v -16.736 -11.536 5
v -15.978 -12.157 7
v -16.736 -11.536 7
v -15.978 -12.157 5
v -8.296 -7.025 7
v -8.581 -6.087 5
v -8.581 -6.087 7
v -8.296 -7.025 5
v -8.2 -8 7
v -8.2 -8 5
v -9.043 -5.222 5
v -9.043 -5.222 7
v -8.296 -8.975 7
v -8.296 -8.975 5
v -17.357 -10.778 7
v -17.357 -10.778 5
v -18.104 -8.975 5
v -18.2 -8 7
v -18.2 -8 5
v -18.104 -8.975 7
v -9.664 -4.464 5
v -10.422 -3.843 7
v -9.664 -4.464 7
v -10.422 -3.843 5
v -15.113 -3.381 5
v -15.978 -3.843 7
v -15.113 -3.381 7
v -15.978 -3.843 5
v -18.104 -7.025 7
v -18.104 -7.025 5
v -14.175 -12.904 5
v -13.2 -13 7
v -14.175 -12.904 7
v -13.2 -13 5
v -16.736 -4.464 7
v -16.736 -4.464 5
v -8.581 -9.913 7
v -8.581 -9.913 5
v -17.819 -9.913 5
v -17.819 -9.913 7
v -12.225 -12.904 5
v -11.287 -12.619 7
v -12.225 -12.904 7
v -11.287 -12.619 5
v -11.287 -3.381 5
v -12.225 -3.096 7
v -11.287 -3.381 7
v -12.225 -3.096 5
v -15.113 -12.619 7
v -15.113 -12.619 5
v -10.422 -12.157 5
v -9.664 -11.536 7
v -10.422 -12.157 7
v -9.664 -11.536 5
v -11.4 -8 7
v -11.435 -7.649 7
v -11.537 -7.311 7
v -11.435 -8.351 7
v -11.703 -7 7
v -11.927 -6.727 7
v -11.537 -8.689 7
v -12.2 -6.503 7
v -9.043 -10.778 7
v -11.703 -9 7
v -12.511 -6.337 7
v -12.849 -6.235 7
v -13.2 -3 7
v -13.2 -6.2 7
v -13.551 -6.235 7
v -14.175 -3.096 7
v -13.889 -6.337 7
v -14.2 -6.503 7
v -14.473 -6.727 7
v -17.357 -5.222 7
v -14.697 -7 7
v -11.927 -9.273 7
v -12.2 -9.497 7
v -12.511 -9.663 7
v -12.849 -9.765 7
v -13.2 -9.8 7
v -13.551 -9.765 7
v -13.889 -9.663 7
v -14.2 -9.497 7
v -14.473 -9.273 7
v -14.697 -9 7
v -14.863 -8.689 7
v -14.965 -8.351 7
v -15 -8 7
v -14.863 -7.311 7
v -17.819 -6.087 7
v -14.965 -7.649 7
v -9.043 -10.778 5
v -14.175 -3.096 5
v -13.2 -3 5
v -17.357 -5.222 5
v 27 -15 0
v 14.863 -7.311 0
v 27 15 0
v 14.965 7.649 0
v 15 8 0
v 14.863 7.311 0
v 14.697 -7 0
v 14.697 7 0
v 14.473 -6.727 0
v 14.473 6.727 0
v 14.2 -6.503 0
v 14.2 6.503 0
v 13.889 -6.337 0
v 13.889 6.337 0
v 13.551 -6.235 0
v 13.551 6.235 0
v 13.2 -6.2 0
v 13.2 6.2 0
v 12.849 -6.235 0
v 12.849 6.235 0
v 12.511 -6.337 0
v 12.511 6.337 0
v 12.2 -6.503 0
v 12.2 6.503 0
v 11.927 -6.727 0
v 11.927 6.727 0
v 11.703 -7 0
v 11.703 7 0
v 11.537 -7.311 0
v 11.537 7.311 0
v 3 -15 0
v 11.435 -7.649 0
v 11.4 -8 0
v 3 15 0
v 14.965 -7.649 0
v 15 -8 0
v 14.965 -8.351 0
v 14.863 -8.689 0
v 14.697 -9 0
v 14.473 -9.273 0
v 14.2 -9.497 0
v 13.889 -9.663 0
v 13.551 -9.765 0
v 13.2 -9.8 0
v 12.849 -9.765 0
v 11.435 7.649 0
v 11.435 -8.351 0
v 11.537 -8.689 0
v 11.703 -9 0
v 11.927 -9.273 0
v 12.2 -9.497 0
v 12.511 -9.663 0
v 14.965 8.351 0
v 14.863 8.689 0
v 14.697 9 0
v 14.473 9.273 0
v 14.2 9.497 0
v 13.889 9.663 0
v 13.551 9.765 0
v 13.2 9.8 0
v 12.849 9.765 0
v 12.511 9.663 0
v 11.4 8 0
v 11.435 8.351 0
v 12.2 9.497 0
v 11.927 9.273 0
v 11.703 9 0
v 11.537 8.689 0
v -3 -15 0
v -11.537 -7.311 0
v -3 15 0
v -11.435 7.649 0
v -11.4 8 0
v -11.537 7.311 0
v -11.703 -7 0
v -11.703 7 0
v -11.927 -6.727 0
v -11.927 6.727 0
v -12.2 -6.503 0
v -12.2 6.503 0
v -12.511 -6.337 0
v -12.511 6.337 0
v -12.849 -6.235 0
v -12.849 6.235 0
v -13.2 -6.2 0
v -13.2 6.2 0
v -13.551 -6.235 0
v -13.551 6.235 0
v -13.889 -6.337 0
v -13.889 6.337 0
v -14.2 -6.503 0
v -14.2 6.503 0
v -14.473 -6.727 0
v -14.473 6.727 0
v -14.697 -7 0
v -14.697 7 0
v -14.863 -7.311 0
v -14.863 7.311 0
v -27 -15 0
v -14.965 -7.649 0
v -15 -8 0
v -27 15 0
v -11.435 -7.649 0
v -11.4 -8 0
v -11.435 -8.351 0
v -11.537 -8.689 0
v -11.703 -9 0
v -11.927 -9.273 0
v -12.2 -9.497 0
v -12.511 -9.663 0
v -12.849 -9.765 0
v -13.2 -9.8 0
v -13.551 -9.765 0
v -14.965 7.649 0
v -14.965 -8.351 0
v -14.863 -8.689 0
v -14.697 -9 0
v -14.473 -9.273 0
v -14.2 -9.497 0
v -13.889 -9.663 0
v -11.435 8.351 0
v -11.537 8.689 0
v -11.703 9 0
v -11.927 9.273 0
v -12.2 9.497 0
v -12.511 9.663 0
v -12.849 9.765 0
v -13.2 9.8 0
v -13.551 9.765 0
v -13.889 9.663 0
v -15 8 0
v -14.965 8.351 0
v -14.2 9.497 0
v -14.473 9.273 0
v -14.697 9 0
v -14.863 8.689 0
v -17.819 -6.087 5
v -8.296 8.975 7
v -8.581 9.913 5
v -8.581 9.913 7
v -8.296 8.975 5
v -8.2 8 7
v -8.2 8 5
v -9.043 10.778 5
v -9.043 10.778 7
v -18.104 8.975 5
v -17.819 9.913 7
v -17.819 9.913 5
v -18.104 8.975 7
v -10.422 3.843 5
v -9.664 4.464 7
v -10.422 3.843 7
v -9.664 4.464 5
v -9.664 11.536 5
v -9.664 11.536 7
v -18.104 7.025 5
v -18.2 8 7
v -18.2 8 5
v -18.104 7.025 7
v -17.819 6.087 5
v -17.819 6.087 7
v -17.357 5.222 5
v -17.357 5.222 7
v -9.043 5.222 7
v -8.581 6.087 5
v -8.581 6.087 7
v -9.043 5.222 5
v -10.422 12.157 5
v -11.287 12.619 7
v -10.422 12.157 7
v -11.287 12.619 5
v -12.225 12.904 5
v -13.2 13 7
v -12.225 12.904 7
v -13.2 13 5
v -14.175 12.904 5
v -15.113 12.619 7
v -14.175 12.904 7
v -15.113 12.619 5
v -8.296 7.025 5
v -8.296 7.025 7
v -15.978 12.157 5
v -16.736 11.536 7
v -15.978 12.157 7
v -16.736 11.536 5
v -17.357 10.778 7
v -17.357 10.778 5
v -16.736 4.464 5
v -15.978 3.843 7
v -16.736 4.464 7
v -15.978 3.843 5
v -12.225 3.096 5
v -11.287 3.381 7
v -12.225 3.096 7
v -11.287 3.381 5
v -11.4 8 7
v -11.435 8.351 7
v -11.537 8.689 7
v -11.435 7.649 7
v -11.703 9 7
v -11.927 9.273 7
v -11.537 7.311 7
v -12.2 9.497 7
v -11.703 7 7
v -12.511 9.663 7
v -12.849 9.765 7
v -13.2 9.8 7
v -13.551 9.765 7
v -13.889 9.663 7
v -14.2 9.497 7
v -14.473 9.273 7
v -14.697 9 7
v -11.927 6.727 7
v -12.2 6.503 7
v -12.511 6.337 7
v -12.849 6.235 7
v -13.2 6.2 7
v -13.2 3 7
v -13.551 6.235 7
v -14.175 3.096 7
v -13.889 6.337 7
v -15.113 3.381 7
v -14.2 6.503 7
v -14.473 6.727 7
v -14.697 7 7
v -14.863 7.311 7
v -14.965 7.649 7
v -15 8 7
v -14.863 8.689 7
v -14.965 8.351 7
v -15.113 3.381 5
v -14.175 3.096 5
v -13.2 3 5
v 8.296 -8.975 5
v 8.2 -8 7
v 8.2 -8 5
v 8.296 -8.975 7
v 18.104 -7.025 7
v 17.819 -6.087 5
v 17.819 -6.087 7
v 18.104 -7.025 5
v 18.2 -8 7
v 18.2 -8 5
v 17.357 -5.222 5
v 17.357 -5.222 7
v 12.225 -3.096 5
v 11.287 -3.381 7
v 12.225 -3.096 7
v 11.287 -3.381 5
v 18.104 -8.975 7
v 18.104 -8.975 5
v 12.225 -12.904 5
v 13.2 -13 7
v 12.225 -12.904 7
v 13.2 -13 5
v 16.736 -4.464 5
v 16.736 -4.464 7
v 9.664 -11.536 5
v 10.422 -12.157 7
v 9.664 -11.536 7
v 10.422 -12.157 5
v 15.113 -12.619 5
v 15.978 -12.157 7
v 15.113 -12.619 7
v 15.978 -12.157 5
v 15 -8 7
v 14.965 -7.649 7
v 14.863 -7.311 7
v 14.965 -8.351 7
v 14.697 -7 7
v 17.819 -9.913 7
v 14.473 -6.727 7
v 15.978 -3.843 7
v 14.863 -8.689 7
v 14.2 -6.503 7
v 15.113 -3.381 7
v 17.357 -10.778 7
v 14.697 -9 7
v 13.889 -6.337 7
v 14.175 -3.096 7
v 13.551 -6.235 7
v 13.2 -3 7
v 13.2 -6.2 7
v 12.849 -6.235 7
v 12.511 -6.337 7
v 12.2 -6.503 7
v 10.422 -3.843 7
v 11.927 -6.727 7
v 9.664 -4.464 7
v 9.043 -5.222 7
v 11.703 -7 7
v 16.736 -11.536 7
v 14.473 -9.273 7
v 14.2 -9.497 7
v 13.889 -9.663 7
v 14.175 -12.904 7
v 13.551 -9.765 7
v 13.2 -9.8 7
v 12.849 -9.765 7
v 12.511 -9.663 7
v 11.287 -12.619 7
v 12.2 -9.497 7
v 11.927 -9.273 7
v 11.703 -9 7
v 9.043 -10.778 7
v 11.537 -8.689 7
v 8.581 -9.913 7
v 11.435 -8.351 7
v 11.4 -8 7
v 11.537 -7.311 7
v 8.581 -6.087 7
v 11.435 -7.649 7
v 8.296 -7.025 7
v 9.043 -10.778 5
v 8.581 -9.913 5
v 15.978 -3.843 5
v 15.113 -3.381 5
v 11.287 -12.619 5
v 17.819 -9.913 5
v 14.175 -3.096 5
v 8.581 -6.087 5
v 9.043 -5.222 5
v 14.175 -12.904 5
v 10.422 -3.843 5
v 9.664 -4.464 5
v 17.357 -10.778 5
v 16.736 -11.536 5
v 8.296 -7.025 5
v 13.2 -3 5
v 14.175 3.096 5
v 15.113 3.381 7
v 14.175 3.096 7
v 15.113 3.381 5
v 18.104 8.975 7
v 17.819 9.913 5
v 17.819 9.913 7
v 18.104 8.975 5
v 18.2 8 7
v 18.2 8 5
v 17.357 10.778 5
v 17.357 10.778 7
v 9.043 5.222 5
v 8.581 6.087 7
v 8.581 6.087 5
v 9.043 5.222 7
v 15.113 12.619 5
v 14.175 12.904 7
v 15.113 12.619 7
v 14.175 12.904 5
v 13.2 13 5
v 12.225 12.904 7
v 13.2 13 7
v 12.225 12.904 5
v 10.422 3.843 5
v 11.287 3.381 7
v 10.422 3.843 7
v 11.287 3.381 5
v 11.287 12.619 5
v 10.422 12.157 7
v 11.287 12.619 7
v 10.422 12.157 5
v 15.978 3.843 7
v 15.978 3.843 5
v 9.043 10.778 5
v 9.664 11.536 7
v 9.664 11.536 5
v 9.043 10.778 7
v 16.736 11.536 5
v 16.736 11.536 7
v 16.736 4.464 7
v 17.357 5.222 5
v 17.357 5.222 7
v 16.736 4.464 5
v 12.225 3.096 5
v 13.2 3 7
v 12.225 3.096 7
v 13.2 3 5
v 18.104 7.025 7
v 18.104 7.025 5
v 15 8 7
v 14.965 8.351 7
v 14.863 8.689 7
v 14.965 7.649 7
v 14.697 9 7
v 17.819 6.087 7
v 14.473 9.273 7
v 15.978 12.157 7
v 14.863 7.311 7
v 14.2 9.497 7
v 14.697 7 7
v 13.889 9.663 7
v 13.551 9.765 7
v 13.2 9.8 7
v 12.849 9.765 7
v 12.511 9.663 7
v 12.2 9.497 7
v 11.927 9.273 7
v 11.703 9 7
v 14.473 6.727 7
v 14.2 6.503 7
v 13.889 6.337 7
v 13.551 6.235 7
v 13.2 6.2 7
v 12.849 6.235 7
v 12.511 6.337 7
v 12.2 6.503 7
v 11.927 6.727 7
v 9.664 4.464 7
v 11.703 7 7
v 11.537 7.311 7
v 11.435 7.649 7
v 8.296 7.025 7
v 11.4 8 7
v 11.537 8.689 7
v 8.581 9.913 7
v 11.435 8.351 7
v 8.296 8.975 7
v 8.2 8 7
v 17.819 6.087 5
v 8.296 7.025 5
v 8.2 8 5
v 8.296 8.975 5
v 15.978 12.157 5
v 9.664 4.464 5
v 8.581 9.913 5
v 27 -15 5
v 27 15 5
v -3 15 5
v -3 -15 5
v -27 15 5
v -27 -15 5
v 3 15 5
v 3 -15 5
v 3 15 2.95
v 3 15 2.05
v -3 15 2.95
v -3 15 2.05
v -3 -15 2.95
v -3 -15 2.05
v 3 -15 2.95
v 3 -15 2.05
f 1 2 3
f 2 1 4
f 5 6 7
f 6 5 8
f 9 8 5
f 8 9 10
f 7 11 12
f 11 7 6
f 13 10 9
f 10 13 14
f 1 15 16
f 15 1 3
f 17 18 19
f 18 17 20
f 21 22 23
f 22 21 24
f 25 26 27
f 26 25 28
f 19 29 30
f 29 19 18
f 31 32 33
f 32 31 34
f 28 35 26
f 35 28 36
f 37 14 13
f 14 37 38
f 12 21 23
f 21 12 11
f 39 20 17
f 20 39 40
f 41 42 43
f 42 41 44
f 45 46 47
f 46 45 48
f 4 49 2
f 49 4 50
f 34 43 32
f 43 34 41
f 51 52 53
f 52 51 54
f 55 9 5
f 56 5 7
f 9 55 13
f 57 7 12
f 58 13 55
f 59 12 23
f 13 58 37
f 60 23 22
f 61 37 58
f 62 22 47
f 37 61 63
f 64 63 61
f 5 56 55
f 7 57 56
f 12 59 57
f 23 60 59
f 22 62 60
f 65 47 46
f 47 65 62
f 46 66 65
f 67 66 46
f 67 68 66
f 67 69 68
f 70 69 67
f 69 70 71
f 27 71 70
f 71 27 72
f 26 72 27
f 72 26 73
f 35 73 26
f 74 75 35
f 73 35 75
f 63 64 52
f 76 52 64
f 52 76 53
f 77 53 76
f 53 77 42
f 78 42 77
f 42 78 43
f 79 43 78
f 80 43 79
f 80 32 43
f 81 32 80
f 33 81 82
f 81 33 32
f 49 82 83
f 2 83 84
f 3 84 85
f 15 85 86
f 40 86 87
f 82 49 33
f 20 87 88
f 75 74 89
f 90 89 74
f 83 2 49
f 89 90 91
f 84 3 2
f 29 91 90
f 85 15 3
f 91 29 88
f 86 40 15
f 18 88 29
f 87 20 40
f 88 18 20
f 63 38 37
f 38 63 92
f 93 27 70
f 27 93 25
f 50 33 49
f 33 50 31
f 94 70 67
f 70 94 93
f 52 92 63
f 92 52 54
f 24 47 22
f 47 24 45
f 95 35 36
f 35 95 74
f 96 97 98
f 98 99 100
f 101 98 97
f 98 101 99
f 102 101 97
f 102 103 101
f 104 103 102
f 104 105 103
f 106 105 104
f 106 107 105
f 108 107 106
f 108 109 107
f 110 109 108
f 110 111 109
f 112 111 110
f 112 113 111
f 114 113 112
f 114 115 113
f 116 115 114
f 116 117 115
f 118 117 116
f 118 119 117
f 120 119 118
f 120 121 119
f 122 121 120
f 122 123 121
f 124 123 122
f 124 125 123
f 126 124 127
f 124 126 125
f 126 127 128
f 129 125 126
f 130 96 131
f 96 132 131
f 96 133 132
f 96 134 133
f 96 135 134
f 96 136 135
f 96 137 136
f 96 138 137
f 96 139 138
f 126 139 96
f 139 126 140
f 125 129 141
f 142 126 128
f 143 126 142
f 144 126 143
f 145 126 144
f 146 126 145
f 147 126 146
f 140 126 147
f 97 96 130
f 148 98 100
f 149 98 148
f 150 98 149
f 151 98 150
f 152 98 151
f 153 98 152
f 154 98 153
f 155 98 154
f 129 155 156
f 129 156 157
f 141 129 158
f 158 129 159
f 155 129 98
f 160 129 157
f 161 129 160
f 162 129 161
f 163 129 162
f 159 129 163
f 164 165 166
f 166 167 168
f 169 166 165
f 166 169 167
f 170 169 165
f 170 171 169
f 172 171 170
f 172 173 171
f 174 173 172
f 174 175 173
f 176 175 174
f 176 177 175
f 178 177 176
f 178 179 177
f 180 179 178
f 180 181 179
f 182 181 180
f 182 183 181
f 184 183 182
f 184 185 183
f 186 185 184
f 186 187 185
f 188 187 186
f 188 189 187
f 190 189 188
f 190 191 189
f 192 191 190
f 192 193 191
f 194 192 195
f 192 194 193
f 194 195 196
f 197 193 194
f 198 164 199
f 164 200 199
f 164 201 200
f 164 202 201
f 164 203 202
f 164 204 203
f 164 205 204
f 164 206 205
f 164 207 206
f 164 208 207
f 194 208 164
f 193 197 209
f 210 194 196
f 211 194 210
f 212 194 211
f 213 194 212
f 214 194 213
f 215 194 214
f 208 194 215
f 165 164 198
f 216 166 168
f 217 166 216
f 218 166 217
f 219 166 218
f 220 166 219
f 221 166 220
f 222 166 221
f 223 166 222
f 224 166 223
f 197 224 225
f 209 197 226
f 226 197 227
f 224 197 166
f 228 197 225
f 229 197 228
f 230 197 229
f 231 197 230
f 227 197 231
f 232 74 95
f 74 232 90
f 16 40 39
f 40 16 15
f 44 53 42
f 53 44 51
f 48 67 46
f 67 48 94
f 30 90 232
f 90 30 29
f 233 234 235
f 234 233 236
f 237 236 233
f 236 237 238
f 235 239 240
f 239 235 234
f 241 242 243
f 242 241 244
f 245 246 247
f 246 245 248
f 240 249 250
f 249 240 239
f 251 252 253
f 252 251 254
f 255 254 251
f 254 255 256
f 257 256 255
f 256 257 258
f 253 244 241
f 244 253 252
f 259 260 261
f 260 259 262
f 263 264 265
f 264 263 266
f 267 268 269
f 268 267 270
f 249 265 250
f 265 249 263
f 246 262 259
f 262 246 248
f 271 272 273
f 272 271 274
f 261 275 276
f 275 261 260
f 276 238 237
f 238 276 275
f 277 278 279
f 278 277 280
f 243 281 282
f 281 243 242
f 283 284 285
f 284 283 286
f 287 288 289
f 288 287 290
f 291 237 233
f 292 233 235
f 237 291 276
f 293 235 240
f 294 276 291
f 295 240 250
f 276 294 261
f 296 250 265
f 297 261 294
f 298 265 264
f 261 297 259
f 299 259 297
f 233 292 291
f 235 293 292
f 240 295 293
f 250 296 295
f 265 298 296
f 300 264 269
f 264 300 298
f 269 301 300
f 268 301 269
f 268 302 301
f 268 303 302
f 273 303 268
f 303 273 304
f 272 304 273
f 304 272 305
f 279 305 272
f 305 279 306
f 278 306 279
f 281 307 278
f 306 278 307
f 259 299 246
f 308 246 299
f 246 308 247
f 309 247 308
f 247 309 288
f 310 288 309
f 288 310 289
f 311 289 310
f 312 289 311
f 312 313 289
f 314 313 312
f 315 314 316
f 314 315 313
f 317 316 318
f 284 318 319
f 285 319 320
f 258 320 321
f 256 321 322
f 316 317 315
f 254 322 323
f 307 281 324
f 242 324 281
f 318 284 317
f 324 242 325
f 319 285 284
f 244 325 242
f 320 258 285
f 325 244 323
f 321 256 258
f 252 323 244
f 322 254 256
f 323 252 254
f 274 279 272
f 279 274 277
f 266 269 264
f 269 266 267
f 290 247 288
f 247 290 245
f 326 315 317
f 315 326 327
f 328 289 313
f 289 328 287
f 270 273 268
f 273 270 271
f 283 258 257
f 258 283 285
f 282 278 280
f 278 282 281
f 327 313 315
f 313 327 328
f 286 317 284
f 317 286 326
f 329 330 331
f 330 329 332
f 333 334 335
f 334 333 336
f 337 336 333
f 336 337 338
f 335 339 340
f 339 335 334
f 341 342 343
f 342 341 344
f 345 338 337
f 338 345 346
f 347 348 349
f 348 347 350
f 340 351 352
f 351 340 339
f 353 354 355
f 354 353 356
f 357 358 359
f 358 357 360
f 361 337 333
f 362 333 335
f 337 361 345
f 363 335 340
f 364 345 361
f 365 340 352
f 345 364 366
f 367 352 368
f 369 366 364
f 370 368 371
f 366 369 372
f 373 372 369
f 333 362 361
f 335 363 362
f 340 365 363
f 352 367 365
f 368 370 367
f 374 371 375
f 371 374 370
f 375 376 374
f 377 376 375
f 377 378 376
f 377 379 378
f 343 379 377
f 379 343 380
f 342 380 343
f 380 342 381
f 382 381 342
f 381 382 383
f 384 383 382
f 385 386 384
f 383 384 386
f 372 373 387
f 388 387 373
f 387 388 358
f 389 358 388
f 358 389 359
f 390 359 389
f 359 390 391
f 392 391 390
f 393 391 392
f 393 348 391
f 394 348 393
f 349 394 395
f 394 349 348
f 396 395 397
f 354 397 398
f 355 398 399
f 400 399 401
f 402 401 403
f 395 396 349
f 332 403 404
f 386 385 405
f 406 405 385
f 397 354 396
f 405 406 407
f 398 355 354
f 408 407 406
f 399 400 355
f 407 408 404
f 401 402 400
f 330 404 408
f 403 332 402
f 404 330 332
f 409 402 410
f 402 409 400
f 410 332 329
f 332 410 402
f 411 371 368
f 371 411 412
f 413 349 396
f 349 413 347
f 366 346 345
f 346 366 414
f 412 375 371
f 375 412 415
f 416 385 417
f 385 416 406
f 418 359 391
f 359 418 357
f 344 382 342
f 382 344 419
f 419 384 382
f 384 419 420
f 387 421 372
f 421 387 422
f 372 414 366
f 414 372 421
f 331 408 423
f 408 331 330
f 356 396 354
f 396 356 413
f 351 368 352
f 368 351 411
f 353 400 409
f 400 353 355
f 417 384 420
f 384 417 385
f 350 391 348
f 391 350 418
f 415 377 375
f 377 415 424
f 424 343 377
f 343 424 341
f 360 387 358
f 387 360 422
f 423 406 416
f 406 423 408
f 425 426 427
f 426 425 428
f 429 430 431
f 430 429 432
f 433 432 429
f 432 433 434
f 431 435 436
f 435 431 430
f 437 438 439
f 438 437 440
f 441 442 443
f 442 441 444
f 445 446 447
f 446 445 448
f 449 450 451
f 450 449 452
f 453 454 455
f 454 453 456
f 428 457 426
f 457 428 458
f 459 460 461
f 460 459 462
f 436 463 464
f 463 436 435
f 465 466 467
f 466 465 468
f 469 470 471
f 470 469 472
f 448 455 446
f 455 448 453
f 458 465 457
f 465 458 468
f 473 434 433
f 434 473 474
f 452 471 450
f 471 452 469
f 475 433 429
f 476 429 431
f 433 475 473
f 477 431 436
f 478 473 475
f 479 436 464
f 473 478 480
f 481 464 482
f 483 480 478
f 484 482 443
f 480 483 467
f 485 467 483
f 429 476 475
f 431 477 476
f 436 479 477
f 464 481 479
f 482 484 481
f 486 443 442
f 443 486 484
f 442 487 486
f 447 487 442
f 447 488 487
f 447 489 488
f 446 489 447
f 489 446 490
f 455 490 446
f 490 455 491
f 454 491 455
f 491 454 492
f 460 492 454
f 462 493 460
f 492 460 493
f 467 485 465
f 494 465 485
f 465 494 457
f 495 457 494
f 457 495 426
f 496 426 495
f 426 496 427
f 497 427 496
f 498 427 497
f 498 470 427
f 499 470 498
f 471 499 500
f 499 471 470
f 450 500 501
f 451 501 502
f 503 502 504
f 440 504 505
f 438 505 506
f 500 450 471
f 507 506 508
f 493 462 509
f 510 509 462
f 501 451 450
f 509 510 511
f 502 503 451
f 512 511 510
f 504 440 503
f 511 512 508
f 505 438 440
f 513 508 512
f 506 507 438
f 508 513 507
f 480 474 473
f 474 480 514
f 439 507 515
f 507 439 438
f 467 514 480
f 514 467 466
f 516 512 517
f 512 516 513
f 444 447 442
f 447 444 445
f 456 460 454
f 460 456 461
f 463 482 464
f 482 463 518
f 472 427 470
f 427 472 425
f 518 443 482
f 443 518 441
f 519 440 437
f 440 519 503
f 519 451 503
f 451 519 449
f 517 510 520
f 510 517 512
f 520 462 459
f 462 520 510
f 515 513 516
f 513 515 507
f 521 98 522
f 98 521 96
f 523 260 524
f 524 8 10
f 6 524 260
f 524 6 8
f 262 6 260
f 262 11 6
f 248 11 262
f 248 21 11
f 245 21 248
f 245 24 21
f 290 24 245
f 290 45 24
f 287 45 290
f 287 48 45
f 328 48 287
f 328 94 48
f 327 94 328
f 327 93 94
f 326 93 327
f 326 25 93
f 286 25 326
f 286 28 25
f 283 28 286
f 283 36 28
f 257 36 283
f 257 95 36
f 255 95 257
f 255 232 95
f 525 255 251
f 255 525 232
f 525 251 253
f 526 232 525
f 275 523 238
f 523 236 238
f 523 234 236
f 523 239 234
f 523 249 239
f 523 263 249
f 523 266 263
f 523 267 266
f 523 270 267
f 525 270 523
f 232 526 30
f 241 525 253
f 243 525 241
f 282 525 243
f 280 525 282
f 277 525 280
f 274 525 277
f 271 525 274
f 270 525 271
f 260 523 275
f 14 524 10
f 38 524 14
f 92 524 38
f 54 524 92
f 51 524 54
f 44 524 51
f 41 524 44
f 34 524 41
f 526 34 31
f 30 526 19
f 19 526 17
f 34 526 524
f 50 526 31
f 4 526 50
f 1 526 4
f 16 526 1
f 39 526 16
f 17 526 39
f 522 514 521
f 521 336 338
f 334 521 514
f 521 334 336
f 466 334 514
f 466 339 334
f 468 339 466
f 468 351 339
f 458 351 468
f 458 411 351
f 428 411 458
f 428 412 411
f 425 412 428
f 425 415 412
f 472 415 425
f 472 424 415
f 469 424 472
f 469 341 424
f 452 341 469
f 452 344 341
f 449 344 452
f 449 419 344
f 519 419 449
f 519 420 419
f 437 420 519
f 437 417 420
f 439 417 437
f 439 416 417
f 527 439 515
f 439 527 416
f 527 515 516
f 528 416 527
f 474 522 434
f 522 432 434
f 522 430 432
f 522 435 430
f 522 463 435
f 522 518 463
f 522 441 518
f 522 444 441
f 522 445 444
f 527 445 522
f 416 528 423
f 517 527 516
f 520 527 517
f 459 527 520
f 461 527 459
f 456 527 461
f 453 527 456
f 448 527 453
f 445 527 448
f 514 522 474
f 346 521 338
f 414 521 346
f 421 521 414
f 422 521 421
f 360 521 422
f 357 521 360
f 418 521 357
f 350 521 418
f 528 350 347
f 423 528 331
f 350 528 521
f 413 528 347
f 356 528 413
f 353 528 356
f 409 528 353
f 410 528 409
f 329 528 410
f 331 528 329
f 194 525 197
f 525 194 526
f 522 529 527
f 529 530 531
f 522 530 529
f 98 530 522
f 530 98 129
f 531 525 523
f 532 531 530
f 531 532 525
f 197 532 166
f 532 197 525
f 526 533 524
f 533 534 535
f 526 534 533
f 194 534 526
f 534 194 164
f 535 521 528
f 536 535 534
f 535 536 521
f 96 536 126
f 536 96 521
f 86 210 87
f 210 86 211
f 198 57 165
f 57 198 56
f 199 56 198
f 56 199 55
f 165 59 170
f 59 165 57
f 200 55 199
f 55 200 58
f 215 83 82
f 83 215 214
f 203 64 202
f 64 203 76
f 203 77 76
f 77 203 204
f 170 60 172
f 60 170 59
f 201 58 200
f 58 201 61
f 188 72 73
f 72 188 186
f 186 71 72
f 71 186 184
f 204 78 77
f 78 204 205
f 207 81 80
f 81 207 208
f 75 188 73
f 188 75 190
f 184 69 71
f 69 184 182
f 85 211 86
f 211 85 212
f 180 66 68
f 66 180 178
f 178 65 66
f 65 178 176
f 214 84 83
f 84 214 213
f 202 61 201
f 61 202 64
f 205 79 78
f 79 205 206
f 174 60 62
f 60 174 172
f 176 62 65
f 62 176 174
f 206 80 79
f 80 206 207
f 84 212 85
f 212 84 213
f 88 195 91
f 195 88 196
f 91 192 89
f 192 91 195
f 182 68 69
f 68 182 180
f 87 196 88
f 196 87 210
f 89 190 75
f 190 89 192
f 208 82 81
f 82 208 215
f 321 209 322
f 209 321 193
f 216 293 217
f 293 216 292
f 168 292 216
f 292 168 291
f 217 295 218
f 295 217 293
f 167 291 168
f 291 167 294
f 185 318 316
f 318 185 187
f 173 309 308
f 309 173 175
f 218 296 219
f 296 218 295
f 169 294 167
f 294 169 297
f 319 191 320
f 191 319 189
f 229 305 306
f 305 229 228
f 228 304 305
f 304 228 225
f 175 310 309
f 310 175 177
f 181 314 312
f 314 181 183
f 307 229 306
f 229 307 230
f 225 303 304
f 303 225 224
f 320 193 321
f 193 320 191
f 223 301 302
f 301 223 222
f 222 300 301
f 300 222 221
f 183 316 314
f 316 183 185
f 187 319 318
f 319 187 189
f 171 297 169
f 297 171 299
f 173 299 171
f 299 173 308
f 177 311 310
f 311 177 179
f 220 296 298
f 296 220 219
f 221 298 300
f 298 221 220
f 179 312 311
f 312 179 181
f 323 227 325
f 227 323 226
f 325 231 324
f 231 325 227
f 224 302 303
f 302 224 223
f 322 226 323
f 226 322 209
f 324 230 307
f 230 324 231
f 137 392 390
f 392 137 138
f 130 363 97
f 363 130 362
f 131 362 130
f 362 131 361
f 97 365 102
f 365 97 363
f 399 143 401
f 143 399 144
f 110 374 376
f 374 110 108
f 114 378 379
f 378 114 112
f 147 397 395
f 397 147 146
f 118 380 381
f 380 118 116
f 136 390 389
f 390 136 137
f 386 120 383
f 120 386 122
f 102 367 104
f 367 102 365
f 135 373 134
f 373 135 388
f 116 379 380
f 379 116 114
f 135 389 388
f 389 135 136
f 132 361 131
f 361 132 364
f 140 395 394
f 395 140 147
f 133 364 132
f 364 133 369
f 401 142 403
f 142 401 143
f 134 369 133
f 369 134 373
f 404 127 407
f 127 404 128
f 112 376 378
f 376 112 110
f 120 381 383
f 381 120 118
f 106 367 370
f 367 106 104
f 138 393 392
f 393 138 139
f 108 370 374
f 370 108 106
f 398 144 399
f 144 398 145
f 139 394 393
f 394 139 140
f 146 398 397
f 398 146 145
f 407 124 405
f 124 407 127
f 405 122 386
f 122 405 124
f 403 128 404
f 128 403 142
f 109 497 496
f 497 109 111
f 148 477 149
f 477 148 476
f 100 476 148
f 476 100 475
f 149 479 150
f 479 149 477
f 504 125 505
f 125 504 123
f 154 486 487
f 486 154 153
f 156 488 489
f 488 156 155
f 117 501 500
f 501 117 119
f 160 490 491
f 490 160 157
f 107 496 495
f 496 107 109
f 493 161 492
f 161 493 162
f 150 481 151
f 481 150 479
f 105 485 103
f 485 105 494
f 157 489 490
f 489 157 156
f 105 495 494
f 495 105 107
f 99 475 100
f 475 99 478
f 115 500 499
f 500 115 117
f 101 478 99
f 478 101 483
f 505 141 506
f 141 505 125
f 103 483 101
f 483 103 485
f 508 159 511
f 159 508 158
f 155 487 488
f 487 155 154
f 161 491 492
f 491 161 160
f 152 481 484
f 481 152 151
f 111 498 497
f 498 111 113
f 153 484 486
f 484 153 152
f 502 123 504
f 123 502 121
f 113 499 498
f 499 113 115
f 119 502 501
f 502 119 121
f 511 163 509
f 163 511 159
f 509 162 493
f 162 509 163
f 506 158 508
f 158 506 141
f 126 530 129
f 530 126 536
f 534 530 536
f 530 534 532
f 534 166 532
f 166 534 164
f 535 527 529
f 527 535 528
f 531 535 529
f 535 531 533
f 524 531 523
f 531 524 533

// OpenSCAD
$fn = 32;

// ----------------------------------------------------------------------
// Living hinge: 54 x 30 mm plates, 0.9 mm flexible web
// ----------------------------------------------------------------------

// --- parameters (mm) ---
plate_len = 24;           // plate length outside the web
plate_w = 30;             // plate width
thick = 5;                // plate thickness
web_half = 3;             // half width of the flex band
web_t = 0.9;              // flexible web thickness
web_z = 2.05;             // web position inside the thickness
boss_d = 10;              // screw boss diameter
boss_h = 7;               // screw boss height
boss_x = 13.2;            // screw boss distance from the web
screw_d = 3.6;            // screw hole

difference() {
  union() {
    /* one flat strip, later thinned at the middle */
    translate([-27, -15, 0]) cube([54, 30, 5]);
    /* screw bosses, sunk 0.5 mm into the plates */
    for (sx = [-13.2, 13.2]) {
      for (sy = [-8, 8]) {
        translate([sx, sy, 0]) cylinder(h = boss_h, d = boss_d);
      }
    }
  }
  /* channel from below: leaves the web on top of it */
  translate([-3, -17.5, -2.5]) cube([6, 35, 4.55]);
  /* channel from above: thins the web down to web_t */
  translate([-3, -17.5, 2.95]) cube([6, 35, 4.55]);
  /* screw holes through the bosses */
  for (sx = [-13.2, 13.2]) {
    for (sy = [-8, 8]) {
      translate([sx, sy, -2.5]) cylinder(h = boss_h + 5, d = screw_d);
    }
  }
}
